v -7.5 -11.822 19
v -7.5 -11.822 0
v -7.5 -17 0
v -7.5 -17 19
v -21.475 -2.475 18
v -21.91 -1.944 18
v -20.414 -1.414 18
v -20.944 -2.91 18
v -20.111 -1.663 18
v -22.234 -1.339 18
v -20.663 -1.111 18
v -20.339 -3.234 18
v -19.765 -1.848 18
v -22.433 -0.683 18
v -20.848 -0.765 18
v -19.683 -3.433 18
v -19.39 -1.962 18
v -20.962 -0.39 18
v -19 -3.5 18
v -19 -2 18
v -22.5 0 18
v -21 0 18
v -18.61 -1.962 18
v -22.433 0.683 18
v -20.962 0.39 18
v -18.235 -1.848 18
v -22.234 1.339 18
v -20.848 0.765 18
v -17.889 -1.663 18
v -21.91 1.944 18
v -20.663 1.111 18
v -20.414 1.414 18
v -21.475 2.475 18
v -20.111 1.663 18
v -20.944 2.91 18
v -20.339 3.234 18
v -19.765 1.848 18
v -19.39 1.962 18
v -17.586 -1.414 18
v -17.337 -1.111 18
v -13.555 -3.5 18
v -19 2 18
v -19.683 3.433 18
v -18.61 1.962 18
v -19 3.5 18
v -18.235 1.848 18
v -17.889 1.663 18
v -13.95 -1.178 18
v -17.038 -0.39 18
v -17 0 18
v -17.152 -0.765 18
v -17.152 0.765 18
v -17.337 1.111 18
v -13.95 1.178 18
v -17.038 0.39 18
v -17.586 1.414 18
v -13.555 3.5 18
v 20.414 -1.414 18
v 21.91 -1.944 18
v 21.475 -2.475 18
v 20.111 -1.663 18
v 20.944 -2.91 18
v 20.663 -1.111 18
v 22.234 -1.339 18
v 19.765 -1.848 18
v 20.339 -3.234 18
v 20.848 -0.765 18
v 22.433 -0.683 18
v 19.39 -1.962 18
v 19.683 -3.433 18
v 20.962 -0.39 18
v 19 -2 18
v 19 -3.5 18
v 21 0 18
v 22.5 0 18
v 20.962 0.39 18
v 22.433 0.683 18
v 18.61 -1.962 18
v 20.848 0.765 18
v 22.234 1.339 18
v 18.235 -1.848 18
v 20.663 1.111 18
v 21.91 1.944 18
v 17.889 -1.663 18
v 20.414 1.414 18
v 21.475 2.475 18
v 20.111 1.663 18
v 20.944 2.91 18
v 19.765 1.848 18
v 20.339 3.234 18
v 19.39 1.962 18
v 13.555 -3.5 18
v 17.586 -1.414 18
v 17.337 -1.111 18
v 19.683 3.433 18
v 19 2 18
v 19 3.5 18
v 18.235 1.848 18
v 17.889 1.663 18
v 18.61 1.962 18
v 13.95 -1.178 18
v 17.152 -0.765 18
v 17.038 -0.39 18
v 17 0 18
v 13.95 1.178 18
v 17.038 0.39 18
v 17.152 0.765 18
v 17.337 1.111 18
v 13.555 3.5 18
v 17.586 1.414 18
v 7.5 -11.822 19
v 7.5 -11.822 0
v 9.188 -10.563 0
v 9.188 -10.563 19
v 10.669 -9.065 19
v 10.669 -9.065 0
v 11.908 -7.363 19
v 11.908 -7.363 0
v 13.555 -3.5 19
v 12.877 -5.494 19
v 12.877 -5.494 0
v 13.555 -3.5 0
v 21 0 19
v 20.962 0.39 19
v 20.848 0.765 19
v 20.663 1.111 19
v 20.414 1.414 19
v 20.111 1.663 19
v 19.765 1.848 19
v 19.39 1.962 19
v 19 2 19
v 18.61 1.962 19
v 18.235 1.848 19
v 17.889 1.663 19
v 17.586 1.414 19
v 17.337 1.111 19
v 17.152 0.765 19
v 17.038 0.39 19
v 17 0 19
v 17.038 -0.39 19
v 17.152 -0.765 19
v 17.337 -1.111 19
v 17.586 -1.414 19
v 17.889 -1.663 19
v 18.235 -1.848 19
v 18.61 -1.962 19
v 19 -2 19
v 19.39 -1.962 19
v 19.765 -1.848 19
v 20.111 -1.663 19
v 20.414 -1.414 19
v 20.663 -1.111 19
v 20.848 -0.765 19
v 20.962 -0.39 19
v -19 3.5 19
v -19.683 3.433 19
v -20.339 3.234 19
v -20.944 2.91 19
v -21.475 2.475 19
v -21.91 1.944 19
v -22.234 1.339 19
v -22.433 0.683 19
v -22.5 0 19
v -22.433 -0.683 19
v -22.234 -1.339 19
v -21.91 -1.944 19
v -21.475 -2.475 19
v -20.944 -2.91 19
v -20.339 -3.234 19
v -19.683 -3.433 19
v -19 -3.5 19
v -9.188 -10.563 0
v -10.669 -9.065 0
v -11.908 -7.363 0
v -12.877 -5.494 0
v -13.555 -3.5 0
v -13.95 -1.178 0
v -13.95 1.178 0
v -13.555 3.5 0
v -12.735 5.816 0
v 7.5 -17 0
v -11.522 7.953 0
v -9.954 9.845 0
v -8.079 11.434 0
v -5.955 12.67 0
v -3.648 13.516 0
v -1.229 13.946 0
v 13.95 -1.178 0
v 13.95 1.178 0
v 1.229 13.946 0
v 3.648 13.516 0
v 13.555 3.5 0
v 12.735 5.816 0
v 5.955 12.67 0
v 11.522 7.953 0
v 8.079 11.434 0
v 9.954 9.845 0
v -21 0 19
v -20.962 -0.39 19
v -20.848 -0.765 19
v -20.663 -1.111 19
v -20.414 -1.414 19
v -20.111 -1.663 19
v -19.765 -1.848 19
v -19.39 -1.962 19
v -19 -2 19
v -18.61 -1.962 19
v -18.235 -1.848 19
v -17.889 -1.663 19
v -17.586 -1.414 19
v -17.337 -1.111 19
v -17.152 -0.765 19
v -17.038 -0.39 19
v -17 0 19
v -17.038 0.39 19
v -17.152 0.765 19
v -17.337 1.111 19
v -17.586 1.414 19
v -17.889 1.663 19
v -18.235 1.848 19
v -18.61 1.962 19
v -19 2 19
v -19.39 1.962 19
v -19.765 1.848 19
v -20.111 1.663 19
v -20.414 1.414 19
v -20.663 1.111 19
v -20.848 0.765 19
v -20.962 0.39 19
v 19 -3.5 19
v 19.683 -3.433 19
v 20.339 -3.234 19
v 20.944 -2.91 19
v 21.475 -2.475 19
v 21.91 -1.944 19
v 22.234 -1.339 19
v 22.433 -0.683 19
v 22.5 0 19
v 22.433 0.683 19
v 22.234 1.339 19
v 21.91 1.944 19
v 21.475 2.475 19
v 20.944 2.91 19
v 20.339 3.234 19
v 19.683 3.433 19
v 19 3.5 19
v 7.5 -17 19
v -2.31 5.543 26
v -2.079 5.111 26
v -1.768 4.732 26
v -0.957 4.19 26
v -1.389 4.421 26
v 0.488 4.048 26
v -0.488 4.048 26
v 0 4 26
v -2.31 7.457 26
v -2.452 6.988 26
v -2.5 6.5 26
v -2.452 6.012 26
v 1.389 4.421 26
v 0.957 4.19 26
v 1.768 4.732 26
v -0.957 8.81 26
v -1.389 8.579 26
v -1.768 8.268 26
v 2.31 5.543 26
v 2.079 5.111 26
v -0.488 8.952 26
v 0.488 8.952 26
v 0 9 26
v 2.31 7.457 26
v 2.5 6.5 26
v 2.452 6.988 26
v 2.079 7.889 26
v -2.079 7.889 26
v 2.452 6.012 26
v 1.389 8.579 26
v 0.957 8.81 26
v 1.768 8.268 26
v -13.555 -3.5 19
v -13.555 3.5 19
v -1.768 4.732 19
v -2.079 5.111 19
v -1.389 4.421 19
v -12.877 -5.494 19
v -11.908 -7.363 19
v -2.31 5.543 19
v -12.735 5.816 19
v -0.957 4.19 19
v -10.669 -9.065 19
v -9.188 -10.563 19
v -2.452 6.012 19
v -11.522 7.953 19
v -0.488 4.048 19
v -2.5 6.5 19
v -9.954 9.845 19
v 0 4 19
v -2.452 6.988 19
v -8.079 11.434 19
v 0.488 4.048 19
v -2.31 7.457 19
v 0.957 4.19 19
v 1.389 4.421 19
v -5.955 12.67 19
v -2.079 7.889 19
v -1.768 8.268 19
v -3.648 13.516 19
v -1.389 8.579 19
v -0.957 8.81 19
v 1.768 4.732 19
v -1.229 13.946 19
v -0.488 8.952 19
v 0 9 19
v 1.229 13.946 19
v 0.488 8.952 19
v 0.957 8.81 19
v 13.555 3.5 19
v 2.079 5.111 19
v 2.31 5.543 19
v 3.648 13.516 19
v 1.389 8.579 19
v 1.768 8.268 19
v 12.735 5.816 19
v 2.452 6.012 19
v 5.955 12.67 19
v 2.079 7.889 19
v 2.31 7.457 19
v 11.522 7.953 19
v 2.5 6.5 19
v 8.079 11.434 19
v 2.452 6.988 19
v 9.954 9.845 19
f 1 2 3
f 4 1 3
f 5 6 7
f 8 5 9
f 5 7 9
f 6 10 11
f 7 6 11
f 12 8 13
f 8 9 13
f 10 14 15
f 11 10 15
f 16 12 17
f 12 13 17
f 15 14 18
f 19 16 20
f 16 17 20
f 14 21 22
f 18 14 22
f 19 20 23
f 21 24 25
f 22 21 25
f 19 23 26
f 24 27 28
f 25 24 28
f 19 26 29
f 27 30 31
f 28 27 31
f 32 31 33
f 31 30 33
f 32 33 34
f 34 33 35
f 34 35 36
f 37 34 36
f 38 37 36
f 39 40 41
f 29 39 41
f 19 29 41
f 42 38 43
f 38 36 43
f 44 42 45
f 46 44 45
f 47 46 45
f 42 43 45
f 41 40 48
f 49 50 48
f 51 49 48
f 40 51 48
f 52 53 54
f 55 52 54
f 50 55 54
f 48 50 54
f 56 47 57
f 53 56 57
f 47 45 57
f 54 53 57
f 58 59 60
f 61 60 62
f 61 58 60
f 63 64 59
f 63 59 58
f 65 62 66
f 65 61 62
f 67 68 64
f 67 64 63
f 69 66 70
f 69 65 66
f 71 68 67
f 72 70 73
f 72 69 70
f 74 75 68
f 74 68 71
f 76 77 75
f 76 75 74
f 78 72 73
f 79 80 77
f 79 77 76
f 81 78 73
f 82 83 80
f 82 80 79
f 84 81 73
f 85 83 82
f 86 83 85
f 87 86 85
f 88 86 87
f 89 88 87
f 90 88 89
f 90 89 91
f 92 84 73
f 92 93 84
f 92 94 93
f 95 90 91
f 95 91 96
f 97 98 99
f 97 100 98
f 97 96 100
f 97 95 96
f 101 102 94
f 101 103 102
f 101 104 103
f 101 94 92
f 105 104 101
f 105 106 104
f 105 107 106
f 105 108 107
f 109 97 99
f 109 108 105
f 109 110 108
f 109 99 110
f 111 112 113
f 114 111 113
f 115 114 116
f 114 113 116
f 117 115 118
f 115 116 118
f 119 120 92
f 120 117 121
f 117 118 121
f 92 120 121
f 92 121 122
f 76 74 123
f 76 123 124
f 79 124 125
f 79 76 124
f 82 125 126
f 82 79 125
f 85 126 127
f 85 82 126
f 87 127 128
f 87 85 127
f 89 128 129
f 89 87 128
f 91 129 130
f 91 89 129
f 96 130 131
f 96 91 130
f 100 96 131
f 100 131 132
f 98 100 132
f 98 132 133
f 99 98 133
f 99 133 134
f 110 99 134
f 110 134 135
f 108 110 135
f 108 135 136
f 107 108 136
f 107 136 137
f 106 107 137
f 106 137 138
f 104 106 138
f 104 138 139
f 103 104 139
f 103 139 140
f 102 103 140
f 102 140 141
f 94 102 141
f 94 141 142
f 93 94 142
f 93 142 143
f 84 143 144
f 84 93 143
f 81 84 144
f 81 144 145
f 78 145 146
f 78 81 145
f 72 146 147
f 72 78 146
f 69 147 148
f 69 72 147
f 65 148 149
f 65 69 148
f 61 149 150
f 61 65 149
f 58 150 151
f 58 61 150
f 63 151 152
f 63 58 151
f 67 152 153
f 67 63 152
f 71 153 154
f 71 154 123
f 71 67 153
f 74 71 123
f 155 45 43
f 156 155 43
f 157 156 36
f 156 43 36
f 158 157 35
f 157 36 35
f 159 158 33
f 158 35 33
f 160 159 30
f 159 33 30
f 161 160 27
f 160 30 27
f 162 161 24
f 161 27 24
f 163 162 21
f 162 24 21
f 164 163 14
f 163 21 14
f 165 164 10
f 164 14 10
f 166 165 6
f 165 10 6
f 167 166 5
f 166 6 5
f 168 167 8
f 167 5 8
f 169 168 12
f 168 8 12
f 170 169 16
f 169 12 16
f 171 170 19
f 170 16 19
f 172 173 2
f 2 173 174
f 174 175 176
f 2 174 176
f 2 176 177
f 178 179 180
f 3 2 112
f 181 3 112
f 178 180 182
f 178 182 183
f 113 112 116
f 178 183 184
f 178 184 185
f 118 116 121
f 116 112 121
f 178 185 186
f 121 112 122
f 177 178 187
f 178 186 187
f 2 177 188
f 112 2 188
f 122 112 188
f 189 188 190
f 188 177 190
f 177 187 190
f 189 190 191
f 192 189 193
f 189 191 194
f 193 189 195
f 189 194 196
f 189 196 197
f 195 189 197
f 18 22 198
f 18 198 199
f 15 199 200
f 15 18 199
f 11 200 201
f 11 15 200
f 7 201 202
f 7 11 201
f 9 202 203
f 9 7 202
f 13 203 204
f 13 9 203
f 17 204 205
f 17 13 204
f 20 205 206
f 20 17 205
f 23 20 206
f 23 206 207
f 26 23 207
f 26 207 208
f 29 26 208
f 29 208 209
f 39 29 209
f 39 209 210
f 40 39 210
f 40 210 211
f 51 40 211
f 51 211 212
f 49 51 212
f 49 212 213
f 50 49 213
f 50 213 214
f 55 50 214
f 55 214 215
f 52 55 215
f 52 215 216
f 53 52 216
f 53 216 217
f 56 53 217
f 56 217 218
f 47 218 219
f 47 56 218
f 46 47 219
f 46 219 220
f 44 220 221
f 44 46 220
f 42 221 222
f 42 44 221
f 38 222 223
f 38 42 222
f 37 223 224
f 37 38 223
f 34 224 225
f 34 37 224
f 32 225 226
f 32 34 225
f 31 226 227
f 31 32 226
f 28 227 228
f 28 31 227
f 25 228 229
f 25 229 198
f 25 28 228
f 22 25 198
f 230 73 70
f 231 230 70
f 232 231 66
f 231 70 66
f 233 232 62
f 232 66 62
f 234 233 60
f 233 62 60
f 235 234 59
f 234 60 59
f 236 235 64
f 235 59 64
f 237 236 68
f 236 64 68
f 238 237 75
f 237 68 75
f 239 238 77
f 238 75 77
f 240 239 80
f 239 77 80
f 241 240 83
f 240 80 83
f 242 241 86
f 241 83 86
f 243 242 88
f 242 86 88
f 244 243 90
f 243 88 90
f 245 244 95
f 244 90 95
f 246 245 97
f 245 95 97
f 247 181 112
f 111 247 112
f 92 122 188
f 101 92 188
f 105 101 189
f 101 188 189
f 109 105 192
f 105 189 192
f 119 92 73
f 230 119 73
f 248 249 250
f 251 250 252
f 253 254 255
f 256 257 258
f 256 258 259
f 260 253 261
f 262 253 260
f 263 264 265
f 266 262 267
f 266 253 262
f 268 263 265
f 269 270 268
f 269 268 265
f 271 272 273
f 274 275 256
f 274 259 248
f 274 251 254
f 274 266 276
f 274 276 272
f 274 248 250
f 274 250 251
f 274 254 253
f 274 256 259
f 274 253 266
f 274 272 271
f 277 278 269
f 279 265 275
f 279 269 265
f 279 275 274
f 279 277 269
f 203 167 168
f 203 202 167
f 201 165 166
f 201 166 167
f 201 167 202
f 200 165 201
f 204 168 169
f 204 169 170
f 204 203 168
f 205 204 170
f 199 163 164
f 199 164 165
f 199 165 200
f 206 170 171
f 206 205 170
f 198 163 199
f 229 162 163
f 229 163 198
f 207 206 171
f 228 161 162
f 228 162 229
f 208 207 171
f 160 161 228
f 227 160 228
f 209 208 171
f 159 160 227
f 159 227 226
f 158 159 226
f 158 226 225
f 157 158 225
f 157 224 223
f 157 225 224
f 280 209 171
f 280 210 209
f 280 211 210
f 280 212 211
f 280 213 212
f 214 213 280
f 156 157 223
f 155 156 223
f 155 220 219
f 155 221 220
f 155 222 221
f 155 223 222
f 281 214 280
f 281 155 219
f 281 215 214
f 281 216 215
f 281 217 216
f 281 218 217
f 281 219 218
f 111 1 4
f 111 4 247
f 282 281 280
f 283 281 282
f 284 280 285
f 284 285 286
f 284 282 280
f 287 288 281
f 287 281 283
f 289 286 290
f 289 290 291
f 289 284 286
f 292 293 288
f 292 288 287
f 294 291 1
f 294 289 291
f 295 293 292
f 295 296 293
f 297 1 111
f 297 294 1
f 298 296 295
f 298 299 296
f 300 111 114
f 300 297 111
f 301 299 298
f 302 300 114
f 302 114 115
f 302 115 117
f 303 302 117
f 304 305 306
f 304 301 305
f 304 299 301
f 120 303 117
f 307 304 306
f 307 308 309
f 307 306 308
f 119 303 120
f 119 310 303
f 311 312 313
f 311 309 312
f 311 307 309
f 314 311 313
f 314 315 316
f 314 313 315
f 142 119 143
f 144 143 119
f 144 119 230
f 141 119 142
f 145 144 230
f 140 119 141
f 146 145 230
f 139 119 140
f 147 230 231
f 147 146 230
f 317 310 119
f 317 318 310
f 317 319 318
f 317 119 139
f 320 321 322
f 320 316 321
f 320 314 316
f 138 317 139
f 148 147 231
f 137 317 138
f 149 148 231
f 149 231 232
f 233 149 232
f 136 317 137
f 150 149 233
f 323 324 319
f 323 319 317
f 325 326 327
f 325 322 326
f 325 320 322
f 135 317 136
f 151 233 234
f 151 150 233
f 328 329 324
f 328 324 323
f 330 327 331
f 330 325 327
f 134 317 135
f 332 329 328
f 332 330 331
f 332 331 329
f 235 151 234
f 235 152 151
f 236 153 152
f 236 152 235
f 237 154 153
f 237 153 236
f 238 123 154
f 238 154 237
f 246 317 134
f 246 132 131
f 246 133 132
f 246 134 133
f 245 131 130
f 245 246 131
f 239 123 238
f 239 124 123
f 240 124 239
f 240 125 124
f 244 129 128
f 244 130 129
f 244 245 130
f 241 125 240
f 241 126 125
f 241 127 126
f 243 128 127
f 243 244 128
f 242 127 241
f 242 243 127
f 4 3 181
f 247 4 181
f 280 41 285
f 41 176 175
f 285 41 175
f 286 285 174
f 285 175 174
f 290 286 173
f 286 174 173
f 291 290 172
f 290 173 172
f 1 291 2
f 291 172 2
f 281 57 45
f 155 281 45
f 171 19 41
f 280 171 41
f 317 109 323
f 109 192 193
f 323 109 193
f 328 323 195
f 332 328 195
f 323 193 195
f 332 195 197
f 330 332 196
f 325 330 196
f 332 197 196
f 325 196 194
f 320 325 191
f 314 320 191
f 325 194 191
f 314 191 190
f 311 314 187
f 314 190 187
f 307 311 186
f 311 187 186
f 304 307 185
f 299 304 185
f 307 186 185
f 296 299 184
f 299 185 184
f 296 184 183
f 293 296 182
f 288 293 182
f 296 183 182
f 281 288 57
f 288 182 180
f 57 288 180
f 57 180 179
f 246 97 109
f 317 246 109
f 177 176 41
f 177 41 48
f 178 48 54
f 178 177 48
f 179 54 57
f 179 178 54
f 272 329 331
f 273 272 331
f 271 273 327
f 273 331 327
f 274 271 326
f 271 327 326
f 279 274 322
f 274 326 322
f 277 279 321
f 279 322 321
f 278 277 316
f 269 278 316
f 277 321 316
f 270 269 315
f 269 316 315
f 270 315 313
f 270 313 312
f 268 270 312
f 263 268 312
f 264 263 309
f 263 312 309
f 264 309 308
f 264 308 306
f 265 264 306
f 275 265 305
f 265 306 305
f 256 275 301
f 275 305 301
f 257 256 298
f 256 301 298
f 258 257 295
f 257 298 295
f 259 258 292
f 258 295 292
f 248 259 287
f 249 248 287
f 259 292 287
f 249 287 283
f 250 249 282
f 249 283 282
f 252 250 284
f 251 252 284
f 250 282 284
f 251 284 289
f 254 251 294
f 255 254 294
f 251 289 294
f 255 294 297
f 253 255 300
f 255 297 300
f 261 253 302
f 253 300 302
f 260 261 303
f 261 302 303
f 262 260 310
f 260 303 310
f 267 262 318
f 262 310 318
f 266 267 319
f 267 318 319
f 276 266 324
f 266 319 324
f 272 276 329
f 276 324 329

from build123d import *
from build123d.topology import SkipClean

# Parameters (mm, degrees)
ESBO_O1_R                = 2
RESSALTO_EXTRUS_O1_DEPTH = 19
CORTE_EXTRUS_O1_DEPTH    = 18
ESBO_O3_R                = 2.5
RESSALTO_EXTRUS_O2_DEPTH = 7


with BuildPart() as part:
    # Esboço1 → Ressalto-extrusão1 (new body)
    with BuildSketch(Plane.XY):
        with BuildLine():
            Line((19, 3.5), (13.555441712, 3.5))
            ThreePointArc((13.555441712, 3.5), (0, 14), (-13.555441712, 3.5))
            Line((-13.555441712, 3.5), (-19, 3.5))
            ThreePointArc((-19, 3.5), (-22.5, 0), (-19, -3.5))
            Line((-19, -3.5), (-13.555441712, -3.5))
            ThreePointArc((-13.555441712, -3.5), (-11.320120282, -8.237407166), (-7.5, -11.821590418))
            Line((-7.5, -11.821590418), (-7.5, -14))
            Line((-7.5, -14), (-7.5, -17))
            Line((-7.5, -17), (7.5, -17))
            Line((7.5, -17), (7.5, -14))
            Line((7.5, -14), (7.5, -11.821590418))
            ThreePointArc((7.5, -11.821590418), (11.320120282, -8.237407166), (13.555441712, -3.5))
            Line((13.555441712, -3.5), (19, -3.5))
            ThreePointArc((19, -3.5), (22.5, 0), (19, 3.5))
        make_face()
        with Locations((19, 0)):
            Circle(ESBO_O1_R, mode=Mode.SUBTRACT)
        with Locations(Location((-19, 0, 0), (0, 0, 180))):
            Circle(ESBO_O1_R, mode=Mode.SUBTRACT)
    extrude(amount=RESSALTO_EXTRUS_O1_DEPTH)

    # Esboço2 → Corte-extrusão1 (cut)
    with SkipClean():  # the faces are left unmerged after this step: merging them gives an invalid solid
        with BuildSketch(Plane(origin=(0, 0, 0), x_dir=(-1, 0, 0), z_dir=(0, 0, -1))):
            with BuildLine():
                Line((13.555441712, 3.5), (23.80699558, 3.5))
                Line((23.80699558, 3.5), (23.80699558, -3.5))
                Line((23.80699558, -3.5), (13.555441712, -3.5))
                ThreePointArc((13.555441712, -3.5), (14, 0), (13.555441712, 3.5))
            make_face()
            with BuildLine():
                Line((-13.555441712, 3.5), (-24.760546325, 3.5))
                Line((-24.760546325, 3.5), (-24.760546325, -3.5))
                Line((-24.760546325, -3.5), (-13.555441712, -3.5))
                ThreePointArc((-13.555441712, -3.5), (-14, 0), (-13.555441712, 3.5))
            make_face()
        extrude(amount=-CORTE_EXTRUS_O1_DEPTH, mode=Mode.SUBTRACT)

    # Esboço3 → Ressalto-extrusão2 (add)
    with SkipClean():  # the faces are left unmerged after this step: merging them gives an invalid solid
        with BuildSketch(Plane.XY.offset(19)):
            with Locations((0, 6.5)):
                Circle(ESBO_O3_R)
        extrude(amount=RESSALTO_EXTRUS_O2_DEPTH)


solid = part.part
